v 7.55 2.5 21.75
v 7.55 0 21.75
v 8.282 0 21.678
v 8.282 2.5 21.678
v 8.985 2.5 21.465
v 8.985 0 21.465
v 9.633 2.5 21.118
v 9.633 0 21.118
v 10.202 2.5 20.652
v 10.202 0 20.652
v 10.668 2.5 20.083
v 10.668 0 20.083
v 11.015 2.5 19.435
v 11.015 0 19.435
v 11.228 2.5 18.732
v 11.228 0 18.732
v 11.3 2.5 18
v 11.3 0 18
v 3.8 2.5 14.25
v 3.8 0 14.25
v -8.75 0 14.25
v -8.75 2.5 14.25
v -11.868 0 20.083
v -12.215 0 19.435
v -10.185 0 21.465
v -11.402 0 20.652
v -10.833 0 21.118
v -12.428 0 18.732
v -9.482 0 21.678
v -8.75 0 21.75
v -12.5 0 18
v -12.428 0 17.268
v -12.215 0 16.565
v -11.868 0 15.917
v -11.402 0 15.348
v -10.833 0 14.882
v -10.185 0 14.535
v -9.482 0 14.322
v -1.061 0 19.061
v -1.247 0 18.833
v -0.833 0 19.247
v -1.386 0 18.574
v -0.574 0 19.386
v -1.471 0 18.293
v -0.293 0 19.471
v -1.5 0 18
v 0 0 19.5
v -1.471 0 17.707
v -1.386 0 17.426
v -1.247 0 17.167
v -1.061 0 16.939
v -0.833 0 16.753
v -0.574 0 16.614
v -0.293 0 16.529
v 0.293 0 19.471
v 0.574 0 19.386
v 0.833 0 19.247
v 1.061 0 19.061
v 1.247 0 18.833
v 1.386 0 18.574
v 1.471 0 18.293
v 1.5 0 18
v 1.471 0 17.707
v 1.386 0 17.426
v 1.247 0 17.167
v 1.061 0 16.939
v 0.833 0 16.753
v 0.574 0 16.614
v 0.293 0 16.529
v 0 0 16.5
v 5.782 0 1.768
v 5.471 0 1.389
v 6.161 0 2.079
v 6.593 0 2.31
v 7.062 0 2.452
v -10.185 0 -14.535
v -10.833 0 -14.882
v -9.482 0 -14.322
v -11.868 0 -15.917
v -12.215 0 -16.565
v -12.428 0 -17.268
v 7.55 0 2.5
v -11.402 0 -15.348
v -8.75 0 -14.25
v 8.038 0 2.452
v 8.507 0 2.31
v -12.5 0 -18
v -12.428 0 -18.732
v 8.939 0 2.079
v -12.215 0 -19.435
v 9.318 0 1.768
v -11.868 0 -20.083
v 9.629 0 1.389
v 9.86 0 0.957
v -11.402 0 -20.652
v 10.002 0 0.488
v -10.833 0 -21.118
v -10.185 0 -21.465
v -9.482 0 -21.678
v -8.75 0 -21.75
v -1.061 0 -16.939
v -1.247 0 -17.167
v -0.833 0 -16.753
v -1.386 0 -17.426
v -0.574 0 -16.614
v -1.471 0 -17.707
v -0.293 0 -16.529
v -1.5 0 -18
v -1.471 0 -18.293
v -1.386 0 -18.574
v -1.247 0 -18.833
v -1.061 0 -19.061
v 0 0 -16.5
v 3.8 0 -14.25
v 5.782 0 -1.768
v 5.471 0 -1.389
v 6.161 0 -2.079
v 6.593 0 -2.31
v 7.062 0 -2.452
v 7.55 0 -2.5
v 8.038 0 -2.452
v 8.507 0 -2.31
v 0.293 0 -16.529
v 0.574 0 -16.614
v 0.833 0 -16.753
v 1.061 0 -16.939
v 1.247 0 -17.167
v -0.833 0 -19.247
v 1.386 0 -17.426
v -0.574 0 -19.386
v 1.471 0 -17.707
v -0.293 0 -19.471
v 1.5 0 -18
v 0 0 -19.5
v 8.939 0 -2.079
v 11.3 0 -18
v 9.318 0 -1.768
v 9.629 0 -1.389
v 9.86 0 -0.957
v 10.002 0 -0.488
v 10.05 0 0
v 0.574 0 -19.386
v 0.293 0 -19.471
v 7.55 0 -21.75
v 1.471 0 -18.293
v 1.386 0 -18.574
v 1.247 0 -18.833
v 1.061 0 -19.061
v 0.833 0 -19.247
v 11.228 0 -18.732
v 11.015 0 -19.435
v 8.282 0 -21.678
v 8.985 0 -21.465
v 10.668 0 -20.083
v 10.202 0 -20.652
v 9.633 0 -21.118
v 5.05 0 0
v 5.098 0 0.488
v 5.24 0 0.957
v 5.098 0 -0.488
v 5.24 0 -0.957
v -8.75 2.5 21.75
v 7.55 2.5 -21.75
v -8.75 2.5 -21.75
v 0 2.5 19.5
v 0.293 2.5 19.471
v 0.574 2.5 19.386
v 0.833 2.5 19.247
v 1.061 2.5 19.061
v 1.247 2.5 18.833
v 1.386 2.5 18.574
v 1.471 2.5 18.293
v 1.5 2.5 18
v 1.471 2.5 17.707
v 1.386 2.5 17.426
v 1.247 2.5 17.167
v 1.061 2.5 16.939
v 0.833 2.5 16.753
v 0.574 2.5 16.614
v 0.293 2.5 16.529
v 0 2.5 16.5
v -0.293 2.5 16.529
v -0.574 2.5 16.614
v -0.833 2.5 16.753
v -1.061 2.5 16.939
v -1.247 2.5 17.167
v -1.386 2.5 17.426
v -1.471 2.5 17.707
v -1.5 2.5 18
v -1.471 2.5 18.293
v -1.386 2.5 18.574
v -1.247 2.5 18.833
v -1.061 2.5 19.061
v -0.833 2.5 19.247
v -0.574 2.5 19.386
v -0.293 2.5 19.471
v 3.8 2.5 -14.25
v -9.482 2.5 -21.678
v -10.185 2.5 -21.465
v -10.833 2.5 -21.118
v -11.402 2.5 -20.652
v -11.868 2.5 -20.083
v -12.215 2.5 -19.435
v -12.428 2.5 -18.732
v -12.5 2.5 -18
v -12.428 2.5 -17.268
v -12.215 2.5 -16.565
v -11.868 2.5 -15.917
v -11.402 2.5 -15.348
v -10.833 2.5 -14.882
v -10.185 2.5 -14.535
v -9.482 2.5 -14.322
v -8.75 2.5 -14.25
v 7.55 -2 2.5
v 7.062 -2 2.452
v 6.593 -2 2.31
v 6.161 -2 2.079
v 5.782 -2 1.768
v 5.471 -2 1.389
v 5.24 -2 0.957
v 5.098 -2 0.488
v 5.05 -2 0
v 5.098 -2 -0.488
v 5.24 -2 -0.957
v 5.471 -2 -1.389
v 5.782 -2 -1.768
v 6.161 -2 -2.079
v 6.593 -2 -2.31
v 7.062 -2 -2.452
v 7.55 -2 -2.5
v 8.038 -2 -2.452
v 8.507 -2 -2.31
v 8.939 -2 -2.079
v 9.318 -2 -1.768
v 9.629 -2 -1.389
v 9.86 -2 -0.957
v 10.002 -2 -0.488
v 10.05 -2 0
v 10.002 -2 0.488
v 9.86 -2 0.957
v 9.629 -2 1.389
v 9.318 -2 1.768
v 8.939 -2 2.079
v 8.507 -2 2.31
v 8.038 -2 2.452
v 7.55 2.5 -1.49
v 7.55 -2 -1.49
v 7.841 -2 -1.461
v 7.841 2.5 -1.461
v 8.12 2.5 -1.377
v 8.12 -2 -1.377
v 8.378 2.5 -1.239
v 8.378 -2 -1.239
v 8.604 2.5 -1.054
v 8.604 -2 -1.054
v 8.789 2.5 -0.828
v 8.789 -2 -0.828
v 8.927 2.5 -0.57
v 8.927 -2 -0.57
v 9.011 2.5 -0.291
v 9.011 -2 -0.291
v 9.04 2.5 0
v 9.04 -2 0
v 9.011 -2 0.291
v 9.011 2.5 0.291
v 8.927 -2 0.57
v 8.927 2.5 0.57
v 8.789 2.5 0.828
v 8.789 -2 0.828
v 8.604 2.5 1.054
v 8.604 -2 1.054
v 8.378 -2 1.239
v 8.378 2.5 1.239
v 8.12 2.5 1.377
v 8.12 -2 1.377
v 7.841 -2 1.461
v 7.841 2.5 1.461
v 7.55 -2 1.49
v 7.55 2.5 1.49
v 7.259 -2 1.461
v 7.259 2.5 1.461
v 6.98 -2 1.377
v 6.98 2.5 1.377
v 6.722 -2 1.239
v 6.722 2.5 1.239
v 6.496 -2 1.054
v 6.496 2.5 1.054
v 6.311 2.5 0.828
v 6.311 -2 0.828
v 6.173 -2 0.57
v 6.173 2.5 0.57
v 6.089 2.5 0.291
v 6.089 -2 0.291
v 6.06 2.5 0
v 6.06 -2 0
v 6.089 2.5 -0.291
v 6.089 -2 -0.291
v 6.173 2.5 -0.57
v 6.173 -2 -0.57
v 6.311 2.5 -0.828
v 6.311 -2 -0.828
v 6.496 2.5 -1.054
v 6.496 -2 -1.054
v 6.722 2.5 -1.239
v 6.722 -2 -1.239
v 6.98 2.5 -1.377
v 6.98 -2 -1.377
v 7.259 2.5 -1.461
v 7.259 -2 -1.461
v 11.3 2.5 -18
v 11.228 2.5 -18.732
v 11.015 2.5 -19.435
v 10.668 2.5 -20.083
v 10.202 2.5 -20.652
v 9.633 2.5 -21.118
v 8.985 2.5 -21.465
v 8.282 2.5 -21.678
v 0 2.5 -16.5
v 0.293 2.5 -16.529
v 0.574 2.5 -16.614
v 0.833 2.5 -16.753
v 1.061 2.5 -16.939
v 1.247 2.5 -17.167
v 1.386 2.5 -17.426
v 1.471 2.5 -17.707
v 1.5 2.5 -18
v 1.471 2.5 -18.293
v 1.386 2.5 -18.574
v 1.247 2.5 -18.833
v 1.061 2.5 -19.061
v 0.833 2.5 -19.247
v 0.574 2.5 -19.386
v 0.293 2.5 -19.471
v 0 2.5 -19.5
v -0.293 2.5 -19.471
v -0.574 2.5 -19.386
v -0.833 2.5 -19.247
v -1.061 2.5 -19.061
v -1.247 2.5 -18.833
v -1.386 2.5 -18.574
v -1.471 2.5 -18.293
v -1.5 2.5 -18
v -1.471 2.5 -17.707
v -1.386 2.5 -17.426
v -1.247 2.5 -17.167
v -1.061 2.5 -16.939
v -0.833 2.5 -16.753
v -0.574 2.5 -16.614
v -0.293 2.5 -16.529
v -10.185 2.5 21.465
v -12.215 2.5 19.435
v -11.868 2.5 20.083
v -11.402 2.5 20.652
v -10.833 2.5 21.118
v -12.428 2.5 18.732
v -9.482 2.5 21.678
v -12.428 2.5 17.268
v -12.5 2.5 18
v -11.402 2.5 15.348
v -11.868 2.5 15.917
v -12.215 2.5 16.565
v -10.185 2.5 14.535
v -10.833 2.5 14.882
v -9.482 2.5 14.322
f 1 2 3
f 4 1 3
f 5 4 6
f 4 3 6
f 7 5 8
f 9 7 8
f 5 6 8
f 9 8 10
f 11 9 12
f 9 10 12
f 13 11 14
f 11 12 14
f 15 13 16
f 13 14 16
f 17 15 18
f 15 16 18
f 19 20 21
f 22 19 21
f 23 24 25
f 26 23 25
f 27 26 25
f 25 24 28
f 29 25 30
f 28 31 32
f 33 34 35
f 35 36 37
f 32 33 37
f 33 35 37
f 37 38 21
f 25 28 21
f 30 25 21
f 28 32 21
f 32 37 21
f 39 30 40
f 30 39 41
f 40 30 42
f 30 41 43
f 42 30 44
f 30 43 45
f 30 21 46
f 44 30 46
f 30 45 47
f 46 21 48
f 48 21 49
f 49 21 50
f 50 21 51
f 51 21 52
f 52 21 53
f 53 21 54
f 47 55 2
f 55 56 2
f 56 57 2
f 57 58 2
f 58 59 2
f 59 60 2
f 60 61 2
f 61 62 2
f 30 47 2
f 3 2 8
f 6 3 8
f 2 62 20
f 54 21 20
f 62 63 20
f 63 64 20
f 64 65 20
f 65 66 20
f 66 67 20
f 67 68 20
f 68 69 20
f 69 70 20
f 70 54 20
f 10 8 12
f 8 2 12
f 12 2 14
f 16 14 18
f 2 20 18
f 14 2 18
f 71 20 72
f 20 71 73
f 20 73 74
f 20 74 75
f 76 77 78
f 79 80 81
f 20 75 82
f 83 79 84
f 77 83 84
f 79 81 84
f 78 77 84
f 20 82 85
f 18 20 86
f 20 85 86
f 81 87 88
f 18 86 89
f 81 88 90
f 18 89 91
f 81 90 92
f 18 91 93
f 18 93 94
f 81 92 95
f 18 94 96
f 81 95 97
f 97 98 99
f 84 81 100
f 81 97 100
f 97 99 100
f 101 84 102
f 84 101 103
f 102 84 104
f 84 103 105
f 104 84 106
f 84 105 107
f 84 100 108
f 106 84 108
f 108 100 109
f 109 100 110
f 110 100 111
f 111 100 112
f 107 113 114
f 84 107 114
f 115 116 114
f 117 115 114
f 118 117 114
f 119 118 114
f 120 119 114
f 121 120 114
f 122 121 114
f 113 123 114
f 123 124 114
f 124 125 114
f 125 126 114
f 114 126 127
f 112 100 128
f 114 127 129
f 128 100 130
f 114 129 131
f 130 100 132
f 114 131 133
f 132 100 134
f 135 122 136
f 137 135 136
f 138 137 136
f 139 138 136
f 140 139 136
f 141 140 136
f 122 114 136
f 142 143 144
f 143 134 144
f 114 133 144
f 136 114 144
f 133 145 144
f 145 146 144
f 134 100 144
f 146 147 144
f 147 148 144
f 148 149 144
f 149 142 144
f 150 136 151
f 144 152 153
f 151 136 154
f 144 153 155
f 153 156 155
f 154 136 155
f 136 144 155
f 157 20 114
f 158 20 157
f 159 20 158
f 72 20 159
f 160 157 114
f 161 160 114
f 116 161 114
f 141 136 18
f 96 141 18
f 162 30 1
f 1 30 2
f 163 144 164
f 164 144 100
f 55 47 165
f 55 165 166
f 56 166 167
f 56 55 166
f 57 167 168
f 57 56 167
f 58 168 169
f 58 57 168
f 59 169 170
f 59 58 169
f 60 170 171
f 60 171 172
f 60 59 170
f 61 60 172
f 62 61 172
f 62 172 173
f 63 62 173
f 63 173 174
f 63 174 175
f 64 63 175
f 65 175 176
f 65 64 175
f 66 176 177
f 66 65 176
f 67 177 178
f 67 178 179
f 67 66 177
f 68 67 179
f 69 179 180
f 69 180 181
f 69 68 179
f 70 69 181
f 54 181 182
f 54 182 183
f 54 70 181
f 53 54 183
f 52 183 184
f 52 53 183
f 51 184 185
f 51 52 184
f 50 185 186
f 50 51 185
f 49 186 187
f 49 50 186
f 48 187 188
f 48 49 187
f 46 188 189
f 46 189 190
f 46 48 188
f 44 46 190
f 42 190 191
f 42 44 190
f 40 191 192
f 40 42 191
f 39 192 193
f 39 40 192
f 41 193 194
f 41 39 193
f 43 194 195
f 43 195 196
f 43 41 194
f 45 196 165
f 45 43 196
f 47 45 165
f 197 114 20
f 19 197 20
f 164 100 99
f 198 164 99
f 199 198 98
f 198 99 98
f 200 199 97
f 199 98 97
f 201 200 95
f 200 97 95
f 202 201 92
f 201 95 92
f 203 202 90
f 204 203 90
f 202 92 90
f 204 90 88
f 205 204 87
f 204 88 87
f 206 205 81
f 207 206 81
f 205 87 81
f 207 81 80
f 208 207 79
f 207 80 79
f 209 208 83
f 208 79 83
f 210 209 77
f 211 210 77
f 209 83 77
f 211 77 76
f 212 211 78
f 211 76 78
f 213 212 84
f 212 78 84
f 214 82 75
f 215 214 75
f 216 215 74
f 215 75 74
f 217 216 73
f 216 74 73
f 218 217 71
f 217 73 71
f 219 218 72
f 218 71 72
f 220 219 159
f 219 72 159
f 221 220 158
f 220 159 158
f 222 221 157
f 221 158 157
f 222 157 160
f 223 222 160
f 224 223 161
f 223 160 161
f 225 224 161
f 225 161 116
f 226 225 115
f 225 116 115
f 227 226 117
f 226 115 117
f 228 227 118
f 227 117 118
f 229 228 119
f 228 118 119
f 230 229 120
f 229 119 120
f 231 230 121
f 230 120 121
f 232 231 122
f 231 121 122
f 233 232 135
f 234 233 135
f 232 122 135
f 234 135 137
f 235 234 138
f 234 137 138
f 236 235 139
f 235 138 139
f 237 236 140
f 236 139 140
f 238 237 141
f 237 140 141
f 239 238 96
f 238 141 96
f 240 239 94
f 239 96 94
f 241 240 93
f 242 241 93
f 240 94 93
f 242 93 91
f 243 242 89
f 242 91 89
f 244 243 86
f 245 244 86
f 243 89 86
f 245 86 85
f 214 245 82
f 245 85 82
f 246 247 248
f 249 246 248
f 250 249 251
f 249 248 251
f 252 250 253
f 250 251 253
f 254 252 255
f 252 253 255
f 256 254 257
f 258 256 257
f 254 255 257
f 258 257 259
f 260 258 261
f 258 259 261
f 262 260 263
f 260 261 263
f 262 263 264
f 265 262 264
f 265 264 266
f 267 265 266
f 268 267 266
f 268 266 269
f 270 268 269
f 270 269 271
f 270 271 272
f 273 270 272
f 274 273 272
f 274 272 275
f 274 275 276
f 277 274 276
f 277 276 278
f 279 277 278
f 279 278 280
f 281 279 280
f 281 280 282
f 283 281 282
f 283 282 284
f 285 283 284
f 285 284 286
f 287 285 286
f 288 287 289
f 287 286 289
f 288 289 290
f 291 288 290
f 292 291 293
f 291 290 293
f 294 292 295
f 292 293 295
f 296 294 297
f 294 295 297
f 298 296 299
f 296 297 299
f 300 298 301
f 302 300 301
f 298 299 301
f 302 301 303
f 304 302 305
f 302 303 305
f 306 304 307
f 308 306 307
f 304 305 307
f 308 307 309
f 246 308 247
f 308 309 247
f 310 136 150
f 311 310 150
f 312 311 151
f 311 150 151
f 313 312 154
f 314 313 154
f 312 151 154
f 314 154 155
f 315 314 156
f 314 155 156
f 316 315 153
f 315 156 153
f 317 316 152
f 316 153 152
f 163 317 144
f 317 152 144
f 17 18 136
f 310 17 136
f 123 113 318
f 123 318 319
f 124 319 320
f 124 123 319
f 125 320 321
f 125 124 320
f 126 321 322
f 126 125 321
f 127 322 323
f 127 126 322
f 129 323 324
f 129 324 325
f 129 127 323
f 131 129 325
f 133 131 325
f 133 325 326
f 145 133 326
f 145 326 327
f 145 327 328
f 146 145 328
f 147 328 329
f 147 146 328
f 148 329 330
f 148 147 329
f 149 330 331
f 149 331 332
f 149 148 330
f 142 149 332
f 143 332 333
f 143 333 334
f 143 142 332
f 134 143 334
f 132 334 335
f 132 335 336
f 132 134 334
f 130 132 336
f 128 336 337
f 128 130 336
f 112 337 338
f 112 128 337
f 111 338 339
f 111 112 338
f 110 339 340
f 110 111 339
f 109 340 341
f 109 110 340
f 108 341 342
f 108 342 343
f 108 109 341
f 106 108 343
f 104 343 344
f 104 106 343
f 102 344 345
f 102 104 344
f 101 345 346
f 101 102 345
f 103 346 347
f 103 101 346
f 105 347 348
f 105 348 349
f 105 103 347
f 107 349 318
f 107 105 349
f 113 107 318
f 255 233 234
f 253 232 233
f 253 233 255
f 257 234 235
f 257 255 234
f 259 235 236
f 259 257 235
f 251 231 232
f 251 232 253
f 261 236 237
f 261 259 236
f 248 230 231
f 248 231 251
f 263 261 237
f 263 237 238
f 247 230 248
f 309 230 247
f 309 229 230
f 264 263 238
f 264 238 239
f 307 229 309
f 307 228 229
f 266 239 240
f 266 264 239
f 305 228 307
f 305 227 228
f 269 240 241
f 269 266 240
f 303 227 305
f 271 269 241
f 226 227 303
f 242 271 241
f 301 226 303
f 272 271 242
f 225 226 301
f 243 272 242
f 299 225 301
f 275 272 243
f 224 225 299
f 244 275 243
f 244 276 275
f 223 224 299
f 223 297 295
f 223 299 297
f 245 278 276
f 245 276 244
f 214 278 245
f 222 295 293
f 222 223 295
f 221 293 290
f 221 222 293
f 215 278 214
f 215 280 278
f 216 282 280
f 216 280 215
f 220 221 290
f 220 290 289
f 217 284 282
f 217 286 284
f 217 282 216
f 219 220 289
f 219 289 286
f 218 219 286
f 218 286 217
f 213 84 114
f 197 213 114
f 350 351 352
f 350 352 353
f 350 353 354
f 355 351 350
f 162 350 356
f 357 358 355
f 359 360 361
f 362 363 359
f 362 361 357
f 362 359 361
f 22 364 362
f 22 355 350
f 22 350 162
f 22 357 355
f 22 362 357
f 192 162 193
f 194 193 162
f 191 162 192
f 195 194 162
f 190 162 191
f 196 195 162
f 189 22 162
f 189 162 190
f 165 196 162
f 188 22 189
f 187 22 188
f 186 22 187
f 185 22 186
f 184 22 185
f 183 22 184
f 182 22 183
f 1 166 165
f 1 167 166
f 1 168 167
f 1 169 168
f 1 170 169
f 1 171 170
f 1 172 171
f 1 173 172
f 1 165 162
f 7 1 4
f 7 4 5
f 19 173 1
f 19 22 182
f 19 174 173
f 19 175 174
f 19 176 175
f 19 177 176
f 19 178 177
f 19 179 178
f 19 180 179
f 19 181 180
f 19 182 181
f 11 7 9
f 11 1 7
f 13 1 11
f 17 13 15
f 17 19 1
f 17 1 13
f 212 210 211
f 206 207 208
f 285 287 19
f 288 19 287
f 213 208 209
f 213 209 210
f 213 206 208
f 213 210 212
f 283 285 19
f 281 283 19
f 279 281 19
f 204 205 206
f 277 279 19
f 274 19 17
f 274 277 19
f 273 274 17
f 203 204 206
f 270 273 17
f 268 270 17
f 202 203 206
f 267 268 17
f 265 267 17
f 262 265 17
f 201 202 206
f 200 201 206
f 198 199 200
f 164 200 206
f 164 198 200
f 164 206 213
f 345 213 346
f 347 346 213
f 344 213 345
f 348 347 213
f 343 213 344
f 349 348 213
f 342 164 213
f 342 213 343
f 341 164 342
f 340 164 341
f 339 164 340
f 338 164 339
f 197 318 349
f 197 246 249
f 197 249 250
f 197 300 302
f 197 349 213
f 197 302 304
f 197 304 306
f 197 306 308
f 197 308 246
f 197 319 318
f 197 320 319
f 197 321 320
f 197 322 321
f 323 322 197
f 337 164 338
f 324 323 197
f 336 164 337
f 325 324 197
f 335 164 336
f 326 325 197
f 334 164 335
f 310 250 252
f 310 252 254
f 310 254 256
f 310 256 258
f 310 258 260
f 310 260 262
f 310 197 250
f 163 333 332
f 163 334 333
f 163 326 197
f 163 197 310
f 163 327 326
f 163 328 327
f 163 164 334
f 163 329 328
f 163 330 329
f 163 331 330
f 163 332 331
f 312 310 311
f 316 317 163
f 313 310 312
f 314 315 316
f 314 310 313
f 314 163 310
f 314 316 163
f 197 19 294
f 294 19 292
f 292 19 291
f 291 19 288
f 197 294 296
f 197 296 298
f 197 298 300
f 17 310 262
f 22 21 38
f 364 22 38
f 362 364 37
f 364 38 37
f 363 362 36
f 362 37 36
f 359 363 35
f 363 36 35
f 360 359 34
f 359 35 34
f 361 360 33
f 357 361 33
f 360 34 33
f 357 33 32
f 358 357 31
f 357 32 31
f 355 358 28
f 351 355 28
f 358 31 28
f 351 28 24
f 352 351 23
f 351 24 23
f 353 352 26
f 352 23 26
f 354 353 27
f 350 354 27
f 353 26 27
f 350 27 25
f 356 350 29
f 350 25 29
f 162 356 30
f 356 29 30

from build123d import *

# Parameters (mm, degrees)
SKETCH1_R           = 1.5
BOSS_EXTRUDE1_DEPTH = 2.5
SKETCH2_R           = 2.5
BOSS_EXTRUDE2_DEPTH = 2
SKETCH3_R           = 1.49
CUT_EXTRUDE1_DEPTH  = 7


with BuildPart() as part:
    # Sketch1 → Boss-Extrude1 (new body)
    with BuildSketch(Plane(origin=(0, 0, 0), x_dir=(1, 0, 0), z_dir=(0, 1, 0))):
        with BuildLine():
            Line((-8.75, 14.25), (3.8, 14.25))
            Line((3.8, 14.25), (3.8, -14.25))
            Line((3.8, -14.25), (-8.75, -14.25))
            ThreePointArc((-8.75, -14.25), (-12.5, -18), (-8.75, -21.75))
            Line((-8.75, -21.75), (7.55, -21.75))
            ThreePointArc((7.55, -21.75), (10.201650429, -20.651650429), (11.3, -18))
            Line((11.3, -18), (11.3, 18))
            ThreePointArc((11.3, 18), (10.201650429, 20.651650429), (7.55, 21.75))
            Line((7.55, 21.75), (-8.75, 21.75))
            ThreePointArc((-8.75, 21.75), (-12.5, 18), (-8.75, 14.25))
        make_face()
        with Locations(Location((0, 18, 0), (0, 0, 270))):
            Circle(SKETCH1_R, mode=Mode.SUBTRACT)
        with Locations(Location((0, -18, 0), (0, 0, 270))):
            Circle(SKETCH1_R, mode=Mode.SUBTRACT)
    extrude(amount=BOSS_EXTRUDE1_DEPTH)

    # Sketch2 → Boss-Extrude2 (add)
    with BuildSketch(Plane.XZ):
        with Locations(Location((7.55, 0, 0), (0, 0, 90))):
            Circle(SKETCH2_R)
    extrude(amount=BOSS_EXTRUDE2_DEPTH)

    # Sketch3 → Cut-Extrude1 (cut)
    with BuildSketch(Plane.XZ.offset(2)):
        with Locations(Location((7.55, 0, 0), (0, 0, 270))):
            Circle(SKETCH3_R)
    extrude(amount=-CUT_EXTRUDE1_DEPTH, mode=Mode.SUBTRACT)


solid = part.part
